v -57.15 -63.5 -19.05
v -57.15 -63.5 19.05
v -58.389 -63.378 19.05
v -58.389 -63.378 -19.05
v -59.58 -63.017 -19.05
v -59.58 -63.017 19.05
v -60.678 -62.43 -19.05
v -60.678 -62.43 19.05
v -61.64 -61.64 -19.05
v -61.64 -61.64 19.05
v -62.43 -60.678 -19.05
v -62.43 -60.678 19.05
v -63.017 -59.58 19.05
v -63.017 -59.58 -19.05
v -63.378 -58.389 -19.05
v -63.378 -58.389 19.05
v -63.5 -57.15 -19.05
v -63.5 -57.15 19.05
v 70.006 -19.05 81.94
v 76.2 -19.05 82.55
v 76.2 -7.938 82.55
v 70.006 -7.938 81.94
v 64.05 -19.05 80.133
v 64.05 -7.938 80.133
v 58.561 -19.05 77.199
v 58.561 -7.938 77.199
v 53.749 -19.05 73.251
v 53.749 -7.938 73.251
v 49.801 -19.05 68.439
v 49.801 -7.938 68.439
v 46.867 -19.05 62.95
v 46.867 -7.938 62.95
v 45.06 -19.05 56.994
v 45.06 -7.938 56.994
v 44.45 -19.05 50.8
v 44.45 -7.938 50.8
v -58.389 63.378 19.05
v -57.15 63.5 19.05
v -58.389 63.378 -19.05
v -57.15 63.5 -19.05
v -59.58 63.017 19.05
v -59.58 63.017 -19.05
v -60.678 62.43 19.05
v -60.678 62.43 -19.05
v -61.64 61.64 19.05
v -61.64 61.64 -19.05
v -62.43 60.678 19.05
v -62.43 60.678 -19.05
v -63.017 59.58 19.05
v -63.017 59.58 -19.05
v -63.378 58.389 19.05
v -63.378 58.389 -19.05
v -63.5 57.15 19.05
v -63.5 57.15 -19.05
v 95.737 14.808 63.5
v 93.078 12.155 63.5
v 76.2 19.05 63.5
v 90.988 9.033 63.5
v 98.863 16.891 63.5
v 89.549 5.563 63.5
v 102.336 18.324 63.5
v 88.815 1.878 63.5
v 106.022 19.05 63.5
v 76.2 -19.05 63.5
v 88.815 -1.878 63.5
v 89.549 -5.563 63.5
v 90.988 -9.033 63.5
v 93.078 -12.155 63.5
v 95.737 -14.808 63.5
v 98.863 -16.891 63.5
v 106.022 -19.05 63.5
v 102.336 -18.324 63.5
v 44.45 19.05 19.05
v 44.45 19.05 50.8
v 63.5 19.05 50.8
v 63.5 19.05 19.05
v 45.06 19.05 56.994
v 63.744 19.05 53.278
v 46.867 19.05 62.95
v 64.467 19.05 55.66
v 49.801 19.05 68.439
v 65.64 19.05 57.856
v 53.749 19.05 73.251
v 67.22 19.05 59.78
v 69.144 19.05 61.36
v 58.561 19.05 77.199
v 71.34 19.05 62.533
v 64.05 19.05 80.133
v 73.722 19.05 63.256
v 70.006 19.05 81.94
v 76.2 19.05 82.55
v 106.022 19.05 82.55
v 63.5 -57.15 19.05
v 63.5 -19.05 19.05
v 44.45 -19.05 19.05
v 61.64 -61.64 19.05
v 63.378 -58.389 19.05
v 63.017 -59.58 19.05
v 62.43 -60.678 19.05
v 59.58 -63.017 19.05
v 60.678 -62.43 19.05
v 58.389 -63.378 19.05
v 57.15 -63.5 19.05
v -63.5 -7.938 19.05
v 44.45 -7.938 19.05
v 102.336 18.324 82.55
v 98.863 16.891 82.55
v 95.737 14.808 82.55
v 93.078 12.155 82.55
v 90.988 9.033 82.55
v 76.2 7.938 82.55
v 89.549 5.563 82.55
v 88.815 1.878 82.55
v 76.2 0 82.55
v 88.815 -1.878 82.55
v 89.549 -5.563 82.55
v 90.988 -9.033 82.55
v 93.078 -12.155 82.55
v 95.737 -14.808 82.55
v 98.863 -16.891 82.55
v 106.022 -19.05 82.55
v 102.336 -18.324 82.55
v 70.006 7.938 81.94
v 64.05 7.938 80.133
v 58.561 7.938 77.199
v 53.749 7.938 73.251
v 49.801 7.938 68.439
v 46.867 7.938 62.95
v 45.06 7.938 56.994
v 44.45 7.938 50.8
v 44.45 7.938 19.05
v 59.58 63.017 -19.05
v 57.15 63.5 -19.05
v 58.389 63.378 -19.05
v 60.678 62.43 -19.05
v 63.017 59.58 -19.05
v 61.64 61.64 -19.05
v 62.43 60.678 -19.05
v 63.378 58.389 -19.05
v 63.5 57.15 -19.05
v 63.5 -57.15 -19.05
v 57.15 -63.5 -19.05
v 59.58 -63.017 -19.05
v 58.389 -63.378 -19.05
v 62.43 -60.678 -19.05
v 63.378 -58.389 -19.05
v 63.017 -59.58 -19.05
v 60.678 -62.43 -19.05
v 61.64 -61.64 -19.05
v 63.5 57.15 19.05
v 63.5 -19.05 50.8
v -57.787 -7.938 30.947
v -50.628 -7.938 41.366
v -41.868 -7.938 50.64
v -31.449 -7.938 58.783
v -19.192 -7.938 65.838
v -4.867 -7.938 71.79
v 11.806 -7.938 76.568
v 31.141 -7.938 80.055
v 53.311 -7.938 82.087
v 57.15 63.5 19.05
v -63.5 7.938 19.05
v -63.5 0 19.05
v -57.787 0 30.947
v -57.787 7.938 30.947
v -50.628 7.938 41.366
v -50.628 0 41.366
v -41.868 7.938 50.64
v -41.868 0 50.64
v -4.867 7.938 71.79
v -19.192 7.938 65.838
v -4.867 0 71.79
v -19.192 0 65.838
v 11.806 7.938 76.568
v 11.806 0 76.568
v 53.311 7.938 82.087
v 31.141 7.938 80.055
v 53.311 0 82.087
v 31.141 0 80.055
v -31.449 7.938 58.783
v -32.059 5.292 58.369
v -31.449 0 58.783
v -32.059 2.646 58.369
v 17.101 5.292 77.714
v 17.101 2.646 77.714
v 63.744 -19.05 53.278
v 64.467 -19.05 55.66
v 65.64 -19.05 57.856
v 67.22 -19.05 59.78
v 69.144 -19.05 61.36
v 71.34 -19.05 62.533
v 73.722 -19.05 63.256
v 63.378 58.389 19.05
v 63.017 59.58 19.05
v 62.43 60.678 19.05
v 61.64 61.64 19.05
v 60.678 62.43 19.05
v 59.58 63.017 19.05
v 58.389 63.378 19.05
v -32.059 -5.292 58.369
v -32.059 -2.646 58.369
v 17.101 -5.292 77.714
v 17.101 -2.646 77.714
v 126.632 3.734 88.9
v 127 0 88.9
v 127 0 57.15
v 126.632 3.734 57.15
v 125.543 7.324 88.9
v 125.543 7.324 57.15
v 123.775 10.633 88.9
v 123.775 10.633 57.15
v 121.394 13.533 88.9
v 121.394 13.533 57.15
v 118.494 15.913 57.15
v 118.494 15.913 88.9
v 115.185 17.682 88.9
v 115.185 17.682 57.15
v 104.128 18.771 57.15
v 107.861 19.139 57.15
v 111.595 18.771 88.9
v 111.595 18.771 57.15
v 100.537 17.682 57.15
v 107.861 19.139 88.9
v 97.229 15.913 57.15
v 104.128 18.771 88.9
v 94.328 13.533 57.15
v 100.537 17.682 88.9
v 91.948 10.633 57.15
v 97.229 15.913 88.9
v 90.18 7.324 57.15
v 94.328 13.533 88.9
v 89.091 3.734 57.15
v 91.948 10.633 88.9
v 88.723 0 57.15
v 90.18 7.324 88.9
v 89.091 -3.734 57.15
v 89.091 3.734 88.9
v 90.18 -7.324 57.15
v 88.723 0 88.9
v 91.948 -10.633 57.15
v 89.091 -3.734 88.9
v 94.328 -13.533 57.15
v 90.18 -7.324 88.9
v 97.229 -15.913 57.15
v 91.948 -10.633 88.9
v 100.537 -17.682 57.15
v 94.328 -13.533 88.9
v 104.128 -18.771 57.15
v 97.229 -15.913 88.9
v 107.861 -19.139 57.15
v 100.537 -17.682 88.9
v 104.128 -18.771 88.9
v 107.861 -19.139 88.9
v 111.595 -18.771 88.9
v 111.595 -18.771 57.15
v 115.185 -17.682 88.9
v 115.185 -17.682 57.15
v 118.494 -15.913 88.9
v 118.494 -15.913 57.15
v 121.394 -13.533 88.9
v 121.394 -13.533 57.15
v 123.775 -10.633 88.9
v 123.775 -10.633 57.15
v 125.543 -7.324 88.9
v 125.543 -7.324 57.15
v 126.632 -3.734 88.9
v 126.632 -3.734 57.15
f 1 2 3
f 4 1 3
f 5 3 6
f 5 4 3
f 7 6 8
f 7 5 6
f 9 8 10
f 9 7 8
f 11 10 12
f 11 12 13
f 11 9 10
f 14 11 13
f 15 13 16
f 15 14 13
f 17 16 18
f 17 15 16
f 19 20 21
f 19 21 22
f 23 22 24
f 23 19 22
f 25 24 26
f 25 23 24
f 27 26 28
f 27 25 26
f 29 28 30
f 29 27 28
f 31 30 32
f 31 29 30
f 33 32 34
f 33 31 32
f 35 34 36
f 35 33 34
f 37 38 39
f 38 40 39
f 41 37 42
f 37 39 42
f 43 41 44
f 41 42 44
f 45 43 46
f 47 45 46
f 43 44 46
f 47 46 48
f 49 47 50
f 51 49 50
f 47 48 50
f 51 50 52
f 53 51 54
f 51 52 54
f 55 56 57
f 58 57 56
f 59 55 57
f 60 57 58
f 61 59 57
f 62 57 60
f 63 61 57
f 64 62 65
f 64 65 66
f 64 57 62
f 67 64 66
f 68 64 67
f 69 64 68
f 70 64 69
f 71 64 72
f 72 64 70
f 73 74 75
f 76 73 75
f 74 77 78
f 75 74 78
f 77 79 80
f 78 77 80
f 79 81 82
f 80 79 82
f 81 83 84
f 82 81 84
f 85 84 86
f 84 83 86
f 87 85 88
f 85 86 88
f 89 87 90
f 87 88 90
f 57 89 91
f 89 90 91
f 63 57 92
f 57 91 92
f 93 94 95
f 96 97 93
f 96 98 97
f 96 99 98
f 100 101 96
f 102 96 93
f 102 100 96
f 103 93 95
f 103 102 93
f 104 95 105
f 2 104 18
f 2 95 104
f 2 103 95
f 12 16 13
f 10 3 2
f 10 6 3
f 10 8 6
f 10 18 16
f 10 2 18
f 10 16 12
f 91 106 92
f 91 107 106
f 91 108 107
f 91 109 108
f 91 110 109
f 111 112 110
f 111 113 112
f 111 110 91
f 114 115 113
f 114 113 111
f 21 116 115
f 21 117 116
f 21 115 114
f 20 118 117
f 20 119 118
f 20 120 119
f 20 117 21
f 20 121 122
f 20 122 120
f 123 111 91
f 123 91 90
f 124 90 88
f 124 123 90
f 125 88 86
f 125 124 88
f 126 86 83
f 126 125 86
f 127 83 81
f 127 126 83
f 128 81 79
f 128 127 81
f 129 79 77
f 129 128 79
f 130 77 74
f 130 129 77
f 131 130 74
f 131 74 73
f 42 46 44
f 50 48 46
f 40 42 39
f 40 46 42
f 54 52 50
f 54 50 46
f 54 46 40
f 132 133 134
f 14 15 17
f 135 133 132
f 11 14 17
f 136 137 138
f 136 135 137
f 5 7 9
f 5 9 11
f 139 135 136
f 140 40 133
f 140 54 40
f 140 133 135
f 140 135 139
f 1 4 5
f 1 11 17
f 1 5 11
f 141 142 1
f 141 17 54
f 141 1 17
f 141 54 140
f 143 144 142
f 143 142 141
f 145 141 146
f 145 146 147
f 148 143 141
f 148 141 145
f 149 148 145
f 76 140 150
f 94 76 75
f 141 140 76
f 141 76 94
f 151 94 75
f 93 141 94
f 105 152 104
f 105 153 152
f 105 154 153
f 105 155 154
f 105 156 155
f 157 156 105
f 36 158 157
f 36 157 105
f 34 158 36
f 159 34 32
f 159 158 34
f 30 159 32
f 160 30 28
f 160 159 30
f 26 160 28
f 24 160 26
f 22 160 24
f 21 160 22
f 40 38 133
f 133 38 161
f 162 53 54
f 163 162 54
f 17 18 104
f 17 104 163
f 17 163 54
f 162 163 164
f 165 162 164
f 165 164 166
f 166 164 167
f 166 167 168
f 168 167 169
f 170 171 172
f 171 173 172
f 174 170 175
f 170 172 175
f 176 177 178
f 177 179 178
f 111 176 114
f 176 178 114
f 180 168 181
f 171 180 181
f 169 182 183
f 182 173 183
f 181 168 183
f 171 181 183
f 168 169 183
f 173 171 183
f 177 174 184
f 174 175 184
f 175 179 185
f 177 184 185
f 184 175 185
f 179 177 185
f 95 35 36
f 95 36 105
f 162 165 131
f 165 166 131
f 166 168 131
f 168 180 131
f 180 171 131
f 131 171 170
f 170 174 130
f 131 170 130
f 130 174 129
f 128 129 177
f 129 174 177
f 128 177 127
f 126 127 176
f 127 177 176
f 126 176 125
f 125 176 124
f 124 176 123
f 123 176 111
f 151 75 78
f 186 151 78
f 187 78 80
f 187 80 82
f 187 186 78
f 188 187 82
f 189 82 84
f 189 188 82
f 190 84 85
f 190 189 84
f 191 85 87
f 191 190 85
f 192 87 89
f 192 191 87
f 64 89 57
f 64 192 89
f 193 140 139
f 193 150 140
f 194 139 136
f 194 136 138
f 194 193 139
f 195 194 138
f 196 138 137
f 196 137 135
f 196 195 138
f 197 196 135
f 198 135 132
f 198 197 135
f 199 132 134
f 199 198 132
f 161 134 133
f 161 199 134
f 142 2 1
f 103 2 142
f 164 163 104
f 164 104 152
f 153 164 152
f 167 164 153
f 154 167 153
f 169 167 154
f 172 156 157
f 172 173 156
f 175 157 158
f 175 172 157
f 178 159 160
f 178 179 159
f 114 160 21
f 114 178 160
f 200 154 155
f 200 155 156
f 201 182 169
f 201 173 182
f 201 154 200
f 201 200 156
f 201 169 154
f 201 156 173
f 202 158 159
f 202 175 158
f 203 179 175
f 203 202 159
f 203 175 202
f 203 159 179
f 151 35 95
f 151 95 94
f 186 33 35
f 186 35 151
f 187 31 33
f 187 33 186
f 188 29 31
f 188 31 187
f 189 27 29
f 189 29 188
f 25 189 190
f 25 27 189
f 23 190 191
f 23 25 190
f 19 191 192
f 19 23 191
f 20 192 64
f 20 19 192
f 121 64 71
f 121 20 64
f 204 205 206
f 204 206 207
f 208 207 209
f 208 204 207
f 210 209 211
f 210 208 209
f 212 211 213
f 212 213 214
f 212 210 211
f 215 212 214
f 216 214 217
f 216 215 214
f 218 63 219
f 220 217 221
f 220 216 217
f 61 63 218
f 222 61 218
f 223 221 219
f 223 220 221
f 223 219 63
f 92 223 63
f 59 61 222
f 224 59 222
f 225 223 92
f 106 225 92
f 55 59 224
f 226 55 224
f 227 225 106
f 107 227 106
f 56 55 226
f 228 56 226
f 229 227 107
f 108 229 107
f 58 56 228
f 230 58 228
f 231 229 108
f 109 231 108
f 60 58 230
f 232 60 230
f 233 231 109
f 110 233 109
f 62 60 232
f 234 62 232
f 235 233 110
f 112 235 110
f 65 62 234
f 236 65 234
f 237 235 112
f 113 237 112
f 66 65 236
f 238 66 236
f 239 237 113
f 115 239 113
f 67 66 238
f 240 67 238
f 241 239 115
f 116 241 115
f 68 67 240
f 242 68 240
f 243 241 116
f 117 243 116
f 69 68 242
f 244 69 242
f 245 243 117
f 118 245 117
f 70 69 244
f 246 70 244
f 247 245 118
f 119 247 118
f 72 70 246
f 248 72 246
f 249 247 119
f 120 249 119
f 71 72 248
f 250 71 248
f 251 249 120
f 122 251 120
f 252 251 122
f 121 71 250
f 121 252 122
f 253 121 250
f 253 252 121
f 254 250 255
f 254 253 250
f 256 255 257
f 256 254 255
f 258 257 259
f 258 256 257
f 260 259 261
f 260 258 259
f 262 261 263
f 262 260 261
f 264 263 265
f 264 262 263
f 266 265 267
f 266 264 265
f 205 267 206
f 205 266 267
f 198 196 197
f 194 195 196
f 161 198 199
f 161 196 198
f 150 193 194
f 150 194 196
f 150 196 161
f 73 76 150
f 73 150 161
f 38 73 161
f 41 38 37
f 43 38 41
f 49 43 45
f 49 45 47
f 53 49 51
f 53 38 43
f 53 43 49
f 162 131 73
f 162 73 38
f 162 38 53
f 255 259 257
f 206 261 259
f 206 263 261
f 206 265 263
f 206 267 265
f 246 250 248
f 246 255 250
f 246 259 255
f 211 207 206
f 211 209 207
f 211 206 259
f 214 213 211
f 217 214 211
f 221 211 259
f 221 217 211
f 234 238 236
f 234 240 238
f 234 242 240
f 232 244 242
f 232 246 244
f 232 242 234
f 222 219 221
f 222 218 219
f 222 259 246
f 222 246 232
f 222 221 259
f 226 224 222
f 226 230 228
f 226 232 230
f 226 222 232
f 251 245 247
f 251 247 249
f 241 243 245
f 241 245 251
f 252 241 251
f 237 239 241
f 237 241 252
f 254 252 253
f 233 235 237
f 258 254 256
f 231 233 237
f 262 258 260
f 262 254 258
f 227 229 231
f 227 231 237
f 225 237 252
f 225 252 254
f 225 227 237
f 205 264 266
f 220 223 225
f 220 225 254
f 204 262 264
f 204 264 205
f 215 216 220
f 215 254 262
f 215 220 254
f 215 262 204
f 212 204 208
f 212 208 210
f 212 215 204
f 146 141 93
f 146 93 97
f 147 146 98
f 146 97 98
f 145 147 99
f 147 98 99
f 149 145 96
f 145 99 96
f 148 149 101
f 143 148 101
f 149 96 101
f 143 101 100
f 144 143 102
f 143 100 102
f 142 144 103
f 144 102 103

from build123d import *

# Parameters (mm, degrees)
F1_DEPTH = 63.5
F0_W     = 18.9613934278
F0_H     = 19.05
F2_DEPTH = 19.05
F3_DEPTH = 7.9375
F5_R     = 6.35


with BuildPart() as f1:
    # F0 (on Front) → F1 (new body, symmetric)
    with BuildSketch(Plane.XZ):
        Polygon((63.5, -19.05), (63.5, 19.05), (44.45, 19.05), (-63.5, 19.05), (-63.5, -19.05), align=None)
    extrude(amount=F1_DEPTH, both=True)

    # F0 (on Front) → F2 (join, symmetric)
    with BuildSketch(Plane.XZ):
        with Locations((98.3806967139, 73.025)):
            Rectangle(F0_W, F0_H)
        with BuildLine():
            Line((44.45, 19.05), (63.5, 19.05))
            Line((63.5, 19.05), (63.5, 50.8))
            ThreePointArc((63.5, 50.8), (67.2197438789, 59.7802561211), (76.2, 63.5))
            Line((76.2, 63.5), (88.9, 63.5))
            Line((88.9, 63.5), (88.9, 82.55))
            Line((88.9, 82.55), (76.2, 82.55))
            ThreePointArc((76.2, 82.55), (53.7493596973, 73.2506403027), (44.45, 50.8))
            Line((44.45, 50.8), (44.45, 19.05))
        make_face()
    extrude(amount=F2_DEPTH, both=True)

    # F0 (on Front) → F3 (join, symmetric)
    with BuildSketch(Plane.XZ):
        with BuildLine():
            Line((-63.5, 19.05), (44.45, 19.05))
            Line((44.45, 19.05), (44.45, 50.8))
            ThreePointArc((44.45, 50.8), (53.7493596973, 73.2506403027), (76.2, 82.55))
            add(Edge.make_bspline(
                [(-63.5, 19.05), (-43.5108728707, 70.1786652207), (14.7244036198, 83.1460282207), (76.2, 82.55)],
                knots=[0, 0, 0, 0, 153.4546838647, 153.4546838647, 153.4546838647, 153.4546838647], degree=3))
        make_face()
    extrude(amount=F3_DEPTH, both=True)

    # F0 (on Front) → F4 (revolve)
    with BuildSketch(Plane.XZ):
        Polygon((107.8613934278, 82.55), (107.8613934278, 63.5), (107.8613934278, 57.15), (127, 57.15), (127, 88.9), (107.8613934278, 88.9), align=None)
    revolve(axis=Axis((107.8613934278, 0, 73.025), (0, 0, 1)))

    # F5
    f5_edges = [f1.edges().sort_by_distance(p)[0] for p in [
        (-63.5, 63.5, 0),
        (-63.5, -63.5, 0),
        (63.5, -63.5, 0),
        (63.5, 63.5, 0),
    ]]
    fillet(f5_edges, radius=F5_R)


solid = f1.part
